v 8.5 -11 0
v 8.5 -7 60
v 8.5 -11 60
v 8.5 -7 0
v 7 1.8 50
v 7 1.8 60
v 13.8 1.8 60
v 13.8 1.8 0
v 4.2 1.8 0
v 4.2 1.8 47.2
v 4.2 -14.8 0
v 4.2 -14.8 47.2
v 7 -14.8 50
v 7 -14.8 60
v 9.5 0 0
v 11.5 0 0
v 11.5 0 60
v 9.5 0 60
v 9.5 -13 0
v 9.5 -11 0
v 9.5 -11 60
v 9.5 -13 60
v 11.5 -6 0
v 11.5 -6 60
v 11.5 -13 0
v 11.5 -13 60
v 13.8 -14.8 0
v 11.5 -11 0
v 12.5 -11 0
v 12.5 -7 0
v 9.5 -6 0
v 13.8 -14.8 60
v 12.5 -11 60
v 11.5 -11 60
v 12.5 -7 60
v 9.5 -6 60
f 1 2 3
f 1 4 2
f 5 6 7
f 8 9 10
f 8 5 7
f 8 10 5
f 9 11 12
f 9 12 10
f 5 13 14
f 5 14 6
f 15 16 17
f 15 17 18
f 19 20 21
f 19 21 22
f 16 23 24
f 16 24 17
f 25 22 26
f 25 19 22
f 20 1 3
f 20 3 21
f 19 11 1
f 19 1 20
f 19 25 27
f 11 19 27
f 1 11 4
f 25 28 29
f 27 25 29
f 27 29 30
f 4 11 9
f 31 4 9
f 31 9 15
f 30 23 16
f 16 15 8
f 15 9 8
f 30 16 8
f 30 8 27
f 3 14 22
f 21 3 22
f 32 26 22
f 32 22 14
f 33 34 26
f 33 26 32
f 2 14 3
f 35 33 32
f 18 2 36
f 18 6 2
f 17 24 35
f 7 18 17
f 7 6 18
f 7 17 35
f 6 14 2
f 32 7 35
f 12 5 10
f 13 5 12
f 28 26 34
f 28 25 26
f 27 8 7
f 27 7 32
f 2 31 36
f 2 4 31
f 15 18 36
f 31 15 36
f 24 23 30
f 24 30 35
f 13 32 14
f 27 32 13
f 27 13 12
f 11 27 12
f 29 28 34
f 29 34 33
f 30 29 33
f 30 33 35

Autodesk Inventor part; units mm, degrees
ref_plane "YZ Plane" through (0, 0, 0) normal (1, 0, 0) x (0, 1, 0)
ref_plane "XZ Plane" through (0, 0, 0) normal (0, 1, 0) x (-1, 0, 0)
ref_plane "XY Plane" through (0, 0, 0) normal (0, 0, 1) x (1, 0, 0)
sketch "Sketch1" plane through (0, 0, 0) normal (0, 0, 1) x (1, 0, 0)
  arc A0 (16, 5) -> (14, 7) centre (14, 5) ccw projected
  line L0 (14, 7) -> (8, 7) projected
  arc A1 (6, 9) -> (8, 7) centre (8, 9) ccw projected
  line L1 (6, 9) -> (6, 25.5) projected
  arc A2 (6, 25.5) -> (4, 27.5) centre (4, 25.5) ccw projected
  line L2 (4, 27.5) -> (-14, 27.5) projected
  arc A3 (-14, 27.5) -> (-16, 25.5) centre (-14, 25.5) ccw projected
  line L3 (-16, 25.5) -> (-16, 20.5) projected
  line L4 (-16, 20.5) -> (4, 20.5) projected
  line L5 (4, 20.5) -> (4, 5) projected
  line L6 (4, 5) -> (14, 5) projected
  line L7 (14, 5) -> (14, -15) projected
  line L8 (14, -15) -> (4, -15) projected
  line L9 (4, -15) -> (4, -20.5) projected
  line L10 (4, -20.5) -> (-16, -20.5) projected
  line L11 (-16, -20.5) -> (-16, -25.5) projected
  arc A4 (-16, -25.5) -> (-14, -27.5) centre (-14, -25.5) ccw projected
  line L12 (-14, -27.5) -> (4, -27.5) projected
  arc A5 (4, -27.5) -> (6, -25.5) centre (4, -25.5) ccw projected
  line L13 (6, -25.5) -> (6, -19) projected
  arc A6 (8, -17) -> (6, -19) centre (8, -19) ccw projected
  line L14 (8, -17) -> (14, -17) projected
  arc A7 (14, -17) -> (16, -15) centre (14, -15) ccw projected
  line L15 (16, -15) -> (16, 5) projected
  circle A8 centre (-10.2273, -23.9687) radius 0.75 projected
  circle A9 centre (-0.7, 24) radius 0.75 projected
  circle A10 centre (-10.2, 24) radius 0.75 projected
  circle A11 centre (-0.7, -24) radius 0.75 projected
  line L16 (11.5, 0) -> (9.5, 0)
  line L17 (9.5, -13) -> (11.5, -13)
  line L18 (12.5, -11) -> (12.5, -7)
  line L19 (8.5, -7) -> (8.5, -11)
  line L20 (8.5, -11) -> (12.5, -7) construction
  line L21 (12.5, -11) -> (8.5, -7) construction
  line L22 (8.5, -11) -> (9.5, -11)
  line L23 (11.5, -11) -> (12.5, -11)
  line L24 (12.5, -7) -> (11.5, -7)
  line L25 (9.5, -7) -> (8.5, -7)
  line L26 (11.5, -13) -> (11.5, -11)
  line L27 (11.5, -7) -> (11.5, 0)
  line L28 (9.5, 0) -> (9.5, -7)
  line L29 (9.5, -11) -> (9.5, -13)
  line L30 (14, -15) -> (4, -15)
  line L31 (4, -15) -> (4, 2)
  line L32 (4, 2) -> (14, 2)
  line L33 (14, 2) -> (14, -15)
  point P0 (0, 0)
  point P1 (10.5, -9)
  dimension "d0" = 2
  dimension "d1" = 13
  dimension "d2" = 4
  dimension "d3" = 4
  dimension "d5" = 17
  dimension "d6" = 1.5
  dimension "d7" = 2
  dimension "d8" = 2
  dimension "d12" = 1
  dimension "d13" = 1
extrude "Extrusion1" add sketch "Sketch1" along normal blind 50 contours L31 L32 L7 L8
sketch "Sketch2" plane through (0, 0, 50) normal (0, 0, 1) x (1, 0, 0)
  line L0 (14, -15) -> (14, 2) projected
  line L1 (14, 2) -> (4, 2) projected
  line L2 (4, 2) -> (4, -15) projected
  line L3 (4, -15) -> (14, -15) projected
  line L4 (8.5, -7) -> (9.5, -7) projected
  line L5 (9.5, -7) -> (9.5, 0) projected
  line L6 (9.5, 0) -> (11.5, 0) projected
  line L7 (11.5, 0) -> (11.5, -7) projected
  line L8 (11.5, -7) -> (12.5, -7) projected
  line L9 (12.5, -7) -> (12.5, -11) projected
  line L10 (12.5, -11) -> (11.5, -11) projected
  line L11 (11.5, -11) -> (11.5, -13) projected
  line L12 (11.5, -13) -> (9.5, -13) projected
  line L13 (9.5, -13) -> (9.5, -11) projected
  line L14 (9.5, -11) -> (8.5, -11) projected
  line L15 (8.5, -11) -> (8.5, -7) projected
  line L16 (14, 2) -> (4, 2) projected
  line L17 (14, -15) -> (7, -15)
  line L18 (7, -15) -> (7, 2)
  line L19 (7, 2) -> (14, 2)
  line L20 (14, 2) -> (14, -15)
  point P0 (0, 0)
  point P1 (7, 2)
  dimension "d11" = 3
extrude "Extrusion2" add sketch "Sketch2" along normal blind 10 contours L3 L18 L1 L0
chamfer "Chamfer1" distance 3 angle 45 1 edges at (4, -6.5, 50)
thicken "Thicken1" operation add thickness 0.2 both sides no extend neighbours yes toward (1, 0, 0) faces at (4, -3.6667, 15.6667) (7.3333, -15, 15.6667) (7.3333, 2, 15.6667) (14, -9.3333, 20)
chamfer "Chamfer2" distance 1 angle 45 2 edges at (11.5, -7, 30) (9.5, -7, 30)
equation "\"d13\" = d12"
properties part number "funnel"
